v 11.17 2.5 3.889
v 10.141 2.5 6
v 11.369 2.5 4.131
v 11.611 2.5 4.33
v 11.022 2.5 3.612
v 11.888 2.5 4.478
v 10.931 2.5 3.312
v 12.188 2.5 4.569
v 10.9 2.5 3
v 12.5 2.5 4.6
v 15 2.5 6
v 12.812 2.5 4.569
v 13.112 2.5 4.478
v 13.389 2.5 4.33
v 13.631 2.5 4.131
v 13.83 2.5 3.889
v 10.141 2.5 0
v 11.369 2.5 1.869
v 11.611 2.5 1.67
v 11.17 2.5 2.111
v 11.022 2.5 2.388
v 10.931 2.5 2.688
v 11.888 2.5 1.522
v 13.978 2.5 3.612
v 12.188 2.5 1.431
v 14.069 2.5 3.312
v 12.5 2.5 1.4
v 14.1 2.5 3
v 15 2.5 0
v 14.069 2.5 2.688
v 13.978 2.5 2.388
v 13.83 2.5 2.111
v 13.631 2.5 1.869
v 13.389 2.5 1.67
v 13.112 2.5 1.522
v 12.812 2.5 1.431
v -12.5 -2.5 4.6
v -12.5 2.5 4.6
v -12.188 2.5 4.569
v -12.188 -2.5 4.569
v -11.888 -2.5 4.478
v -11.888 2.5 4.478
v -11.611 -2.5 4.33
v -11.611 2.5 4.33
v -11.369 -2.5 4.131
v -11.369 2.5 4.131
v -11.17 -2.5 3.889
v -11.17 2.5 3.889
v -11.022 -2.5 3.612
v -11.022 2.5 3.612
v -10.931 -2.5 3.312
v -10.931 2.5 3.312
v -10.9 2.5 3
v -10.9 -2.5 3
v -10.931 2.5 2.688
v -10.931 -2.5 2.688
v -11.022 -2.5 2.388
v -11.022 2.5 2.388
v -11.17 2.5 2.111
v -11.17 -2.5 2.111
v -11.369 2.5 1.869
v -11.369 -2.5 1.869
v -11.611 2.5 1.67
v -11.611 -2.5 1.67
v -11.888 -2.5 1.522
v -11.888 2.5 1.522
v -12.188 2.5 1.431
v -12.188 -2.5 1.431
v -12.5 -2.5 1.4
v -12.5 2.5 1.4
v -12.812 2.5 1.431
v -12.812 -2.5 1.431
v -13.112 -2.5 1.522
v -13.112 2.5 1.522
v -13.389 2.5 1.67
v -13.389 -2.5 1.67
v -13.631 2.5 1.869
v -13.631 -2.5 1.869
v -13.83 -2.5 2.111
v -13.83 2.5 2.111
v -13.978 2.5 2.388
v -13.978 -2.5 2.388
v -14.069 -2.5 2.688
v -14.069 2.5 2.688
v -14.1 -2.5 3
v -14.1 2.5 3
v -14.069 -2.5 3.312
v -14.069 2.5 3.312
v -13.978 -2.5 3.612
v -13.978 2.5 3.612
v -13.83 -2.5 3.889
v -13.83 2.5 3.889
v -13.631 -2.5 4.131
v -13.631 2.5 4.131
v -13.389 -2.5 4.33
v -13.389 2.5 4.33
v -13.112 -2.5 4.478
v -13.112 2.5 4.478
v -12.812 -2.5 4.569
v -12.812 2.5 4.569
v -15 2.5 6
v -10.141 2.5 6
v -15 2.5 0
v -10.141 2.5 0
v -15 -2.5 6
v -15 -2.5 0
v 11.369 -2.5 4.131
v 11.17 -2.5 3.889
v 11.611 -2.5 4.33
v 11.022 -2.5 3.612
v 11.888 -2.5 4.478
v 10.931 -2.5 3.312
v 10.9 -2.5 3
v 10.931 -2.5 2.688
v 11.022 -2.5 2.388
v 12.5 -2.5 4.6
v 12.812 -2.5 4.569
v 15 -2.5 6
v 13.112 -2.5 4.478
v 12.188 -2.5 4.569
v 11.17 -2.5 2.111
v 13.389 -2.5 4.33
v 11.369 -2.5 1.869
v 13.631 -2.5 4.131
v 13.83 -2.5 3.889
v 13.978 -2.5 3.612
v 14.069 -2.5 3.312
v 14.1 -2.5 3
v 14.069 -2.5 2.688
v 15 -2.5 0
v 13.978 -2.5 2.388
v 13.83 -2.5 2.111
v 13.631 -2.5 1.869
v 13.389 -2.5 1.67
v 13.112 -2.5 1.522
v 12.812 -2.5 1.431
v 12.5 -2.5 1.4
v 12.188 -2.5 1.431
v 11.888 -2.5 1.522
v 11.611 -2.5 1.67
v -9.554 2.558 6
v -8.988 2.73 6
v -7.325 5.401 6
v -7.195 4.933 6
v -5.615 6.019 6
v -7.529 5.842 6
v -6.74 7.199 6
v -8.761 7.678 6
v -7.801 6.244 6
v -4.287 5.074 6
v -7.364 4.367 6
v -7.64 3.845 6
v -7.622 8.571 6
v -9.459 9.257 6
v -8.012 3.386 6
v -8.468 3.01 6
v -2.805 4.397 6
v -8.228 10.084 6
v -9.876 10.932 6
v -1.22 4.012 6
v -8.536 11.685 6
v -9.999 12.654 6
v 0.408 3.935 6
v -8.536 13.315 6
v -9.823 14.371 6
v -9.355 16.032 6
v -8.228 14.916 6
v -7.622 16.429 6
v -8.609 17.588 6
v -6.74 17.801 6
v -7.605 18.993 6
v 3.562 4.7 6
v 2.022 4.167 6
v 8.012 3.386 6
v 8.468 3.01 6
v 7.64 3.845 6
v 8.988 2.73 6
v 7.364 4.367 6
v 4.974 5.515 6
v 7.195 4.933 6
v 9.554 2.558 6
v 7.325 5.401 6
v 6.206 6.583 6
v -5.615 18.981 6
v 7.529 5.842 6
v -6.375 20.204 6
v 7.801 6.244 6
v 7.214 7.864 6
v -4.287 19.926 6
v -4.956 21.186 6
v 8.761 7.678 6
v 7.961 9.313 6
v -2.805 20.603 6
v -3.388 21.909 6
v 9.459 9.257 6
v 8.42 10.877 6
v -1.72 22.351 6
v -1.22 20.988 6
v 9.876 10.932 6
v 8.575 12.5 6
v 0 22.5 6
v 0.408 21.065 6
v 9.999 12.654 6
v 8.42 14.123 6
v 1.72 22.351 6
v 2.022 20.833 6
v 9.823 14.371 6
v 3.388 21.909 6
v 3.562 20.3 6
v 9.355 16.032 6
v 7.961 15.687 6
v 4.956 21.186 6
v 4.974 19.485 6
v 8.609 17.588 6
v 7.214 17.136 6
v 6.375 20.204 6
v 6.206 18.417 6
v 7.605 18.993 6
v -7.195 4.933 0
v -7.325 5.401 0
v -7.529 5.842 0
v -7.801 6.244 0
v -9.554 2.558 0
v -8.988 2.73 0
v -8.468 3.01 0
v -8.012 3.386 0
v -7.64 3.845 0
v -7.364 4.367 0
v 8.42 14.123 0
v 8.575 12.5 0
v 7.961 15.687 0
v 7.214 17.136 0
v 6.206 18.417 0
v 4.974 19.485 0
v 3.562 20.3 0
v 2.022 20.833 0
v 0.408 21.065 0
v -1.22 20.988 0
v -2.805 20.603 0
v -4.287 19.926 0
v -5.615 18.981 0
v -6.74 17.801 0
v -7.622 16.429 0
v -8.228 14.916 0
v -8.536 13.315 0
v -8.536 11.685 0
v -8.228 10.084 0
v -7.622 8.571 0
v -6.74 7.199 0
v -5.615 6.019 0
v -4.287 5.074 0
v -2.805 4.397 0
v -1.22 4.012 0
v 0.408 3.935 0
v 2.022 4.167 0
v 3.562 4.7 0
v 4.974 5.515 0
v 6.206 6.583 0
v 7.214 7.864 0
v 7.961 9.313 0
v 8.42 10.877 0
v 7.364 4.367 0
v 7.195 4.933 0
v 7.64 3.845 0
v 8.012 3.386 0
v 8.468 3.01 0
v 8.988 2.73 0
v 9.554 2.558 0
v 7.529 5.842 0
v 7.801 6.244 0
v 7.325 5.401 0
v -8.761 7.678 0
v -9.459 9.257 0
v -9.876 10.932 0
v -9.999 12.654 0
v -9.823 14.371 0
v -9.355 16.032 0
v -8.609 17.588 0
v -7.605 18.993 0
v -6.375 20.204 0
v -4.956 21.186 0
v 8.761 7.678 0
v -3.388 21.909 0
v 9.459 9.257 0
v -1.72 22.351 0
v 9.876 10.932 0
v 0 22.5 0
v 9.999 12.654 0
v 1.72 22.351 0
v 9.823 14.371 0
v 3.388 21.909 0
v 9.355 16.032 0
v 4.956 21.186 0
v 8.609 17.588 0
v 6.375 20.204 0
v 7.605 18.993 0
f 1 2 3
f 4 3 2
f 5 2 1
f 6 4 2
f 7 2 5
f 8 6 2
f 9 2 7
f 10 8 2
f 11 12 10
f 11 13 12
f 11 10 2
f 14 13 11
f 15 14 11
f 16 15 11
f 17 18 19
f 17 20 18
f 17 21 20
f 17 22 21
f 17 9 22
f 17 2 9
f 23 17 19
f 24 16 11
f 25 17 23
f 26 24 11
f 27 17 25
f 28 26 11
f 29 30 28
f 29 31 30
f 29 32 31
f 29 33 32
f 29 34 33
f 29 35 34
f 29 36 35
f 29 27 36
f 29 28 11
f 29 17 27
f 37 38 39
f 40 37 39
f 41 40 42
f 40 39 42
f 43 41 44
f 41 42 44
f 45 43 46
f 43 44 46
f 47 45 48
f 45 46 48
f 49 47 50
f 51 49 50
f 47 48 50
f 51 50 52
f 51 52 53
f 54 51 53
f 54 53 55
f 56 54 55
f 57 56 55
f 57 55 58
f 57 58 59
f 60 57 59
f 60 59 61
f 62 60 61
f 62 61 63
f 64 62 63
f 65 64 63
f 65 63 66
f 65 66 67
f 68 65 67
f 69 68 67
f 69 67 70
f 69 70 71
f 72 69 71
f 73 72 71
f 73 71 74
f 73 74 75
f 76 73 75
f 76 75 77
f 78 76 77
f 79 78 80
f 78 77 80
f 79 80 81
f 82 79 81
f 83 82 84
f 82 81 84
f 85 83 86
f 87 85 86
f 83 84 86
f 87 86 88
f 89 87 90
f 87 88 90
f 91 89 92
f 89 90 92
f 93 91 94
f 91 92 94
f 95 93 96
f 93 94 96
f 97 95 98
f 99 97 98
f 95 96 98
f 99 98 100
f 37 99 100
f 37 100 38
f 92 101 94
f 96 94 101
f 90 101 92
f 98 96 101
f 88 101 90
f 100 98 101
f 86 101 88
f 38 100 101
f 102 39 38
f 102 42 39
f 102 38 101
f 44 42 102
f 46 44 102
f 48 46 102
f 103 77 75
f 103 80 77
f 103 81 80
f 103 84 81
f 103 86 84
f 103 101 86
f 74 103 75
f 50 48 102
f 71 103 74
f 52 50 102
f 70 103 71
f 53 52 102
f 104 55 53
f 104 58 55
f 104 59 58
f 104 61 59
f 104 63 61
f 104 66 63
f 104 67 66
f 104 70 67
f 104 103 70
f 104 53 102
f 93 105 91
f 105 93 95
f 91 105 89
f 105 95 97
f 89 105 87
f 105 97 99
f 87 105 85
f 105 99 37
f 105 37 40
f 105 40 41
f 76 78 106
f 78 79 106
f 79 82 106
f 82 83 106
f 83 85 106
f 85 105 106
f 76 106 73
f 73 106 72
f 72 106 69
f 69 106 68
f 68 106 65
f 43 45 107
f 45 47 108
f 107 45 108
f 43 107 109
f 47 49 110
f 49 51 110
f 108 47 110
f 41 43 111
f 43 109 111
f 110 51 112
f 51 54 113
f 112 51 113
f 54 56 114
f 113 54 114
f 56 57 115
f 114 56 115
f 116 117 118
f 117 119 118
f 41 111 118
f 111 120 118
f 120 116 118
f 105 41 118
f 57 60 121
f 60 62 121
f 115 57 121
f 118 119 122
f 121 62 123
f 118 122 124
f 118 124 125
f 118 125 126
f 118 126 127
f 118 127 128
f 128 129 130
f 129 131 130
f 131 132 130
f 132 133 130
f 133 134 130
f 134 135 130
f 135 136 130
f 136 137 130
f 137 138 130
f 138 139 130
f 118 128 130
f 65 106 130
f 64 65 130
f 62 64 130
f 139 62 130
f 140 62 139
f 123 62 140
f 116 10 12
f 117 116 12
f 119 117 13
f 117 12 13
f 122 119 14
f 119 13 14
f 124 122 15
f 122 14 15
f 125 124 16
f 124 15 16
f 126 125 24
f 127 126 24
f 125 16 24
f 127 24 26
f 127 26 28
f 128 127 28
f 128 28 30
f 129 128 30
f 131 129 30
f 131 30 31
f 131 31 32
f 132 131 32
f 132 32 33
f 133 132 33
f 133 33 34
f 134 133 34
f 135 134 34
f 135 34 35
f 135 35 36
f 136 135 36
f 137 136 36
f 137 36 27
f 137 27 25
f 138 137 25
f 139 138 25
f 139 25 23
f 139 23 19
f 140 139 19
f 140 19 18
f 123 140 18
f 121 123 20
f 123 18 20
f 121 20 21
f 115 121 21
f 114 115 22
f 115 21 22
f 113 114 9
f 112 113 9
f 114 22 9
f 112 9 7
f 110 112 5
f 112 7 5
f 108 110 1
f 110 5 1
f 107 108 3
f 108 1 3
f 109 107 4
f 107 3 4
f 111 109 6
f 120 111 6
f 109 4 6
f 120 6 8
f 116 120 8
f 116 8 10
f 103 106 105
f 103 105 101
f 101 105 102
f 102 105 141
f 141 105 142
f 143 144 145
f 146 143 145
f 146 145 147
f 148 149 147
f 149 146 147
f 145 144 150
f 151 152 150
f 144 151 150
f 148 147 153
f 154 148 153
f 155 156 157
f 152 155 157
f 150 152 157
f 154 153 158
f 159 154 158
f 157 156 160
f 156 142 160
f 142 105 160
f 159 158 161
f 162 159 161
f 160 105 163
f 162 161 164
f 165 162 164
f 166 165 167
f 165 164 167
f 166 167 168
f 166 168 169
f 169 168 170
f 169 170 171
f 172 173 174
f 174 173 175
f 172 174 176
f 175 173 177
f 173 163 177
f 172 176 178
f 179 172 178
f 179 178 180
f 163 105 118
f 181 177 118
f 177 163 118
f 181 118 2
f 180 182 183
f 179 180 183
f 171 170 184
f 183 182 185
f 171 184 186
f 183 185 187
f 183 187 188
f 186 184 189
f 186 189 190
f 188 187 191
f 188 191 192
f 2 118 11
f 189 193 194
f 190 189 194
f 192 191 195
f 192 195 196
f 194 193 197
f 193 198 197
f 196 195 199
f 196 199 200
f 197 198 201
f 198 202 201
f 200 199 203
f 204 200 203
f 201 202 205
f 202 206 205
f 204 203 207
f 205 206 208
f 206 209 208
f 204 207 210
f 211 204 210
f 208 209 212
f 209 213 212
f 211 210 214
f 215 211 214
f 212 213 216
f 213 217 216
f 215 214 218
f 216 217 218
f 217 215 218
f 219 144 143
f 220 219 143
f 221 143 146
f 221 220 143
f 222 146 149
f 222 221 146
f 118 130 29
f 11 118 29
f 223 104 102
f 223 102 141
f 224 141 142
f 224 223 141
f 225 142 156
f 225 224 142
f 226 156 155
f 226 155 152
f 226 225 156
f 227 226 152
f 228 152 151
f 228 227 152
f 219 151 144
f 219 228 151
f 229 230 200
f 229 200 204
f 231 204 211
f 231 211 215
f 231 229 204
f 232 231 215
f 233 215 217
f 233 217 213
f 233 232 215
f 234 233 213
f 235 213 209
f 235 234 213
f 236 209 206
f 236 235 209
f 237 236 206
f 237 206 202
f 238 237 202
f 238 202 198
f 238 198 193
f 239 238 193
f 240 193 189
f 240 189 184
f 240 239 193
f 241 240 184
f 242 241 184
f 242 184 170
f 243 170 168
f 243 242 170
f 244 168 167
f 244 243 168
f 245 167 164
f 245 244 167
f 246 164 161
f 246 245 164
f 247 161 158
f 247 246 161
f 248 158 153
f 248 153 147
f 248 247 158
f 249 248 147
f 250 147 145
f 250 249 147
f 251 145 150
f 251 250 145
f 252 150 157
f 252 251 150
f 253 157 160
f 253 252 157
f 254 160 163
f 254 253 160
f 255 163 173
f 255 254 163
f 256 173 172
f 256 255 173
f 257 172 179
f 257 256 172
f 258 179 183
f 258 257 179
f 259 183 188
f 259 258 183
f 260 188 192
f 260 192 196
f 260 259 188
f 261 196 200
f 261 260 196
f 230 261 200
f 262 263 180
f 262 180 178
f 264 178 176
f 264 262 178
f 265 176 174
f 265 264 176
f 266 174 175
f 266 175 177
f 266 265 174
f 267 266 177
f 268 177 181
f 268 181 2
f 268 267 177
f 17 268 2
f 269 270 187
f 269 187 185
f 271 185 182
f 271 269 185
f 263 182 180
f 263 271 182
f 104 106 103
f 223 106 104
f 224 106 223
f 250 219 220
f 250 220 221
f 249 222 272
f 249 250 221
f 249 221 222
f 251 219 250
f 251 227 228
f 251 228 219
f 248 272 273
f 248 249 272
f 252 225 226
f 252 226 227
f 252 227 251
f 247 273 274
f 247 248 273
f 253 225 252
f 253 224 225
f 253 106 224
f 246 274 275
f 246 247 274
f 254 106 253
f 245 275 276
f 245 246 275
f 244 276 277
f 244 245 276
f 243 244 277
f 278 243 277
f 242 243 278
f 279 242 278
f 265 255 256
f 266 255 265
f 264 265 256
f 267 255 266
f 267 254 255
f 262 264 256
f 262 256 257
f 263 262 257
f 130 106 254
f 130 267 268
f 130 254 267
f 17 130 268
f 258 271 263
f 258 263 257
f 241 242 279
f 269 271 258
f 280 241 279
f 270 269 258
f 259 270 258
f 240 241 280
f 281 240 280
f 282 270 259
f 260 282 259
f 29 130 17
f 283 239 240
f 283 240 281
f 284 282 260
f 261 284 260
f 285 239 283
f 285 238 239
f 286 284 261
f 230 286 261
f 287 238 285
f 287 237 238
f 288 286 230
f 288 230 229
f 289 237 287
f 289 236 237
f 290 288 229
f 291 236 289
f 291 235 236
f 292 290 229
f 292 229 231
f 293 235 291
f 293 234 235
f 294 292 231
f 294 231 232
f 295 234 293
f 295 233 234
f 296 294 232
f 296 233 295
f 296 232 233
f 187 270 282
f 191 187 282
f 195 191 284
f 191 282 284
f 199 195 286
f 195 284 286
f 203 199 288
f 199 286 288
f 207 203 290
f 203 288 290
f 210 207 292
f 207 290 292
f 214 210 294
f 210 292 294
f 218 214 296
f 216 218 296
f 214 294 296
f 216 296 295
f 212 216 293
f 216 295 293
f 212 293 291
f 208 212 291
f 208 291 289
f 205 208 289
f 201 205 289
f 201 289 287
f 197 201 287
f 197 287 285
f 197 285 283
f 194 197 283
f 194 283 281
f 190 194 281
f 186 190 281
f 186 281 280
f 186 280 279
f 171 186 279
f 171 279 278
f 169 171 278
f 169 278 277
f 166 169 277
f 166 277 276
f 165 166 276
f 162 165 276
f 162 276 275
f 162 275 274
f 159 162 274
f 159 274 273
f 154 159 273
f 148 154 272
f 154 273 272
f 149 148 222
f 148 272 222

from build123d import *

# Parameters (mm, degrees)
IZIM1_R                     = 10
IZIM1_R_2                   = 8.575
IZIM1_W                     = 30
IZIM1_H                     = 5
Y_KSEKLIK_EKSTR_ZYON1_DEPTH = 6
RADYUS1_R                   = 3
IZIM3_R                     = 1.6
KES_EKSTR_ZYON1_DEPTH       = 6
IZIM2_R                     = 1.6
KES_EKSTR_ZYON2_DEPTH       = 6


with BuildPart() as part:
    # Çizim1 → Yükseklik-Ekstrüzyon1 (new body)
    # profile 1 of 4: a face of its own
    with BuildSketch(Plane.XY):
        with Locations((0, 12.5)):
            Circle(IZIM1_R)
        with Locations((0, 12.5)):
            Circle(IZIM1_R_2, mode=Mode.SUBTRACT)
    # profile 2 of 4: a face of its own
    with BuildSketch(Plane.XY):
        with BuildLine():
            ThreePointArc((7.141428429, 5.5), (3.872983346, 3.280455543), (0, 2.5))
            Line((0, 2.5), (7.141428429, 2.5))
            Line((7.141428429, 2.5), (7.141428429, 5.5))
        make_face()
    # profile 3 of 4: a face of its own
    with BuildSketch(Plane.XY):
        with BuildLine():
            Line((-7.141428429, 5.5), (-7.141428429, 2.5))
            Line((-7.141428429, 2.5), (0, 2.5))
            ThreePointArc((0, 2.5), (-3.872983346, 3.280455543), (-7.141428429, 5.5))
        make_face()
    # profile 4 of 4: a face of its own
    with BuildSketch(Plane.XY):
        Rectangle(IZIM1_W, IZIM1_H)
    extrude(amount=Y_KSEKLIK_EKSTR_ZYON1_DEPTH)

    # Radyus1
    # the kernel refuses this fillet: 3 mm, written as the material it adds along each edge
    with BuildSketch(Plane(origin=(-7.141428429, 2.5, 0), x_dir=(-1, 0, 0), z_dir=(0, 0, 1))) as radyus1_piece_1:
        with BuildLine():
            CenterArc((RADYUS1_R, -RADYUS1_R), RADYUS1_R, 90, 90)
            Line((0, -RADYUS1_R), (0, 0))
            Line((0, 0), (RADYUS1_R, 0))
        make_face()
    extrude(amount=6)
    with BuildSketch(Plane(origin=(-7.141428429, 5.5, 0), x_dir=(0, -1, 0), z_dir=(0, 0, 1))) as radyus1_piece_2:
        with BuildLine():
            CenterArc((1.133352902, -3), RADYUS1_R, 90, 38.729363069)
            ThreePointArc((-0.743574691, -0.659670363), (-0.363585739, -0.33907996), (0, 0))
            Line((0, 0), (1.133352902, 0))
        make_face()
    extrude(amount=6)
    with BuildSketch(Plane(origin=(7.141428429, 5.5, 0), x_dir=(0, -1, 0), z_dir=(0, 0, 1))) as radyus1_piece_3:
        with BuildLine():
            CenterArc((1.133352902, 3), RADYUS1_R, 231.270636931, 38.729363069)
            ThreePointArc((-0.743574691, 0.659670363), (-0.363585739, 0.33907996), (0, 0))
            Line((0, 0), (1.133352902, 0))
        make_face()
    extrude(amount=6)
    with BuildSketch(Plane(origin=(7.141428429, 2.5, 0), x_dir=(1, 0, 0), z_dir=(0, 0, 1))) as radyus1_piece_4:
        with BuildLine():
            CenterArc((RADYUS1_R, RADYUS1_R), RADYUS1_R, 180, 90)
            Line((0, RADYUS1_R), (0, 0))
            Line((0, 0), (RADYUS1_R, 0))
        make_face()
    extrude(amount=6)

    # Çizim3 → Kes-Ekstrüzyon1 (cut)
    with BuildSketch(Plane(origin=(0, 2.5, 0), x_dir=(1, 0, 0), z_dir=(0, 1, 0))):
        with Locations(Location((12.5, -3, 0), (0, 0, 270))):
            Circle(IZIM3_R)
    extrude(amount=-KES_EKSTR_ZYON1_DEPTH, mode=Mode.SUBTRACT)

    # Çizim2 → Kes-Ekstrüzyon2 (cut)
    with BuildSketch(Plane(origin=(0, 2.5, 0), x_dir=(1, 0, 0), z_dir=(0, 1, 0))):
        with Locations(Location((-12.5, -3, 0), (0, 0, 270))):
            Circle(IZIM2_R)
    extrude(amount=-KES_EKSTR_ZYON2_DEPTH, mode=Mode.SUBTRACT)


solid = part.part
